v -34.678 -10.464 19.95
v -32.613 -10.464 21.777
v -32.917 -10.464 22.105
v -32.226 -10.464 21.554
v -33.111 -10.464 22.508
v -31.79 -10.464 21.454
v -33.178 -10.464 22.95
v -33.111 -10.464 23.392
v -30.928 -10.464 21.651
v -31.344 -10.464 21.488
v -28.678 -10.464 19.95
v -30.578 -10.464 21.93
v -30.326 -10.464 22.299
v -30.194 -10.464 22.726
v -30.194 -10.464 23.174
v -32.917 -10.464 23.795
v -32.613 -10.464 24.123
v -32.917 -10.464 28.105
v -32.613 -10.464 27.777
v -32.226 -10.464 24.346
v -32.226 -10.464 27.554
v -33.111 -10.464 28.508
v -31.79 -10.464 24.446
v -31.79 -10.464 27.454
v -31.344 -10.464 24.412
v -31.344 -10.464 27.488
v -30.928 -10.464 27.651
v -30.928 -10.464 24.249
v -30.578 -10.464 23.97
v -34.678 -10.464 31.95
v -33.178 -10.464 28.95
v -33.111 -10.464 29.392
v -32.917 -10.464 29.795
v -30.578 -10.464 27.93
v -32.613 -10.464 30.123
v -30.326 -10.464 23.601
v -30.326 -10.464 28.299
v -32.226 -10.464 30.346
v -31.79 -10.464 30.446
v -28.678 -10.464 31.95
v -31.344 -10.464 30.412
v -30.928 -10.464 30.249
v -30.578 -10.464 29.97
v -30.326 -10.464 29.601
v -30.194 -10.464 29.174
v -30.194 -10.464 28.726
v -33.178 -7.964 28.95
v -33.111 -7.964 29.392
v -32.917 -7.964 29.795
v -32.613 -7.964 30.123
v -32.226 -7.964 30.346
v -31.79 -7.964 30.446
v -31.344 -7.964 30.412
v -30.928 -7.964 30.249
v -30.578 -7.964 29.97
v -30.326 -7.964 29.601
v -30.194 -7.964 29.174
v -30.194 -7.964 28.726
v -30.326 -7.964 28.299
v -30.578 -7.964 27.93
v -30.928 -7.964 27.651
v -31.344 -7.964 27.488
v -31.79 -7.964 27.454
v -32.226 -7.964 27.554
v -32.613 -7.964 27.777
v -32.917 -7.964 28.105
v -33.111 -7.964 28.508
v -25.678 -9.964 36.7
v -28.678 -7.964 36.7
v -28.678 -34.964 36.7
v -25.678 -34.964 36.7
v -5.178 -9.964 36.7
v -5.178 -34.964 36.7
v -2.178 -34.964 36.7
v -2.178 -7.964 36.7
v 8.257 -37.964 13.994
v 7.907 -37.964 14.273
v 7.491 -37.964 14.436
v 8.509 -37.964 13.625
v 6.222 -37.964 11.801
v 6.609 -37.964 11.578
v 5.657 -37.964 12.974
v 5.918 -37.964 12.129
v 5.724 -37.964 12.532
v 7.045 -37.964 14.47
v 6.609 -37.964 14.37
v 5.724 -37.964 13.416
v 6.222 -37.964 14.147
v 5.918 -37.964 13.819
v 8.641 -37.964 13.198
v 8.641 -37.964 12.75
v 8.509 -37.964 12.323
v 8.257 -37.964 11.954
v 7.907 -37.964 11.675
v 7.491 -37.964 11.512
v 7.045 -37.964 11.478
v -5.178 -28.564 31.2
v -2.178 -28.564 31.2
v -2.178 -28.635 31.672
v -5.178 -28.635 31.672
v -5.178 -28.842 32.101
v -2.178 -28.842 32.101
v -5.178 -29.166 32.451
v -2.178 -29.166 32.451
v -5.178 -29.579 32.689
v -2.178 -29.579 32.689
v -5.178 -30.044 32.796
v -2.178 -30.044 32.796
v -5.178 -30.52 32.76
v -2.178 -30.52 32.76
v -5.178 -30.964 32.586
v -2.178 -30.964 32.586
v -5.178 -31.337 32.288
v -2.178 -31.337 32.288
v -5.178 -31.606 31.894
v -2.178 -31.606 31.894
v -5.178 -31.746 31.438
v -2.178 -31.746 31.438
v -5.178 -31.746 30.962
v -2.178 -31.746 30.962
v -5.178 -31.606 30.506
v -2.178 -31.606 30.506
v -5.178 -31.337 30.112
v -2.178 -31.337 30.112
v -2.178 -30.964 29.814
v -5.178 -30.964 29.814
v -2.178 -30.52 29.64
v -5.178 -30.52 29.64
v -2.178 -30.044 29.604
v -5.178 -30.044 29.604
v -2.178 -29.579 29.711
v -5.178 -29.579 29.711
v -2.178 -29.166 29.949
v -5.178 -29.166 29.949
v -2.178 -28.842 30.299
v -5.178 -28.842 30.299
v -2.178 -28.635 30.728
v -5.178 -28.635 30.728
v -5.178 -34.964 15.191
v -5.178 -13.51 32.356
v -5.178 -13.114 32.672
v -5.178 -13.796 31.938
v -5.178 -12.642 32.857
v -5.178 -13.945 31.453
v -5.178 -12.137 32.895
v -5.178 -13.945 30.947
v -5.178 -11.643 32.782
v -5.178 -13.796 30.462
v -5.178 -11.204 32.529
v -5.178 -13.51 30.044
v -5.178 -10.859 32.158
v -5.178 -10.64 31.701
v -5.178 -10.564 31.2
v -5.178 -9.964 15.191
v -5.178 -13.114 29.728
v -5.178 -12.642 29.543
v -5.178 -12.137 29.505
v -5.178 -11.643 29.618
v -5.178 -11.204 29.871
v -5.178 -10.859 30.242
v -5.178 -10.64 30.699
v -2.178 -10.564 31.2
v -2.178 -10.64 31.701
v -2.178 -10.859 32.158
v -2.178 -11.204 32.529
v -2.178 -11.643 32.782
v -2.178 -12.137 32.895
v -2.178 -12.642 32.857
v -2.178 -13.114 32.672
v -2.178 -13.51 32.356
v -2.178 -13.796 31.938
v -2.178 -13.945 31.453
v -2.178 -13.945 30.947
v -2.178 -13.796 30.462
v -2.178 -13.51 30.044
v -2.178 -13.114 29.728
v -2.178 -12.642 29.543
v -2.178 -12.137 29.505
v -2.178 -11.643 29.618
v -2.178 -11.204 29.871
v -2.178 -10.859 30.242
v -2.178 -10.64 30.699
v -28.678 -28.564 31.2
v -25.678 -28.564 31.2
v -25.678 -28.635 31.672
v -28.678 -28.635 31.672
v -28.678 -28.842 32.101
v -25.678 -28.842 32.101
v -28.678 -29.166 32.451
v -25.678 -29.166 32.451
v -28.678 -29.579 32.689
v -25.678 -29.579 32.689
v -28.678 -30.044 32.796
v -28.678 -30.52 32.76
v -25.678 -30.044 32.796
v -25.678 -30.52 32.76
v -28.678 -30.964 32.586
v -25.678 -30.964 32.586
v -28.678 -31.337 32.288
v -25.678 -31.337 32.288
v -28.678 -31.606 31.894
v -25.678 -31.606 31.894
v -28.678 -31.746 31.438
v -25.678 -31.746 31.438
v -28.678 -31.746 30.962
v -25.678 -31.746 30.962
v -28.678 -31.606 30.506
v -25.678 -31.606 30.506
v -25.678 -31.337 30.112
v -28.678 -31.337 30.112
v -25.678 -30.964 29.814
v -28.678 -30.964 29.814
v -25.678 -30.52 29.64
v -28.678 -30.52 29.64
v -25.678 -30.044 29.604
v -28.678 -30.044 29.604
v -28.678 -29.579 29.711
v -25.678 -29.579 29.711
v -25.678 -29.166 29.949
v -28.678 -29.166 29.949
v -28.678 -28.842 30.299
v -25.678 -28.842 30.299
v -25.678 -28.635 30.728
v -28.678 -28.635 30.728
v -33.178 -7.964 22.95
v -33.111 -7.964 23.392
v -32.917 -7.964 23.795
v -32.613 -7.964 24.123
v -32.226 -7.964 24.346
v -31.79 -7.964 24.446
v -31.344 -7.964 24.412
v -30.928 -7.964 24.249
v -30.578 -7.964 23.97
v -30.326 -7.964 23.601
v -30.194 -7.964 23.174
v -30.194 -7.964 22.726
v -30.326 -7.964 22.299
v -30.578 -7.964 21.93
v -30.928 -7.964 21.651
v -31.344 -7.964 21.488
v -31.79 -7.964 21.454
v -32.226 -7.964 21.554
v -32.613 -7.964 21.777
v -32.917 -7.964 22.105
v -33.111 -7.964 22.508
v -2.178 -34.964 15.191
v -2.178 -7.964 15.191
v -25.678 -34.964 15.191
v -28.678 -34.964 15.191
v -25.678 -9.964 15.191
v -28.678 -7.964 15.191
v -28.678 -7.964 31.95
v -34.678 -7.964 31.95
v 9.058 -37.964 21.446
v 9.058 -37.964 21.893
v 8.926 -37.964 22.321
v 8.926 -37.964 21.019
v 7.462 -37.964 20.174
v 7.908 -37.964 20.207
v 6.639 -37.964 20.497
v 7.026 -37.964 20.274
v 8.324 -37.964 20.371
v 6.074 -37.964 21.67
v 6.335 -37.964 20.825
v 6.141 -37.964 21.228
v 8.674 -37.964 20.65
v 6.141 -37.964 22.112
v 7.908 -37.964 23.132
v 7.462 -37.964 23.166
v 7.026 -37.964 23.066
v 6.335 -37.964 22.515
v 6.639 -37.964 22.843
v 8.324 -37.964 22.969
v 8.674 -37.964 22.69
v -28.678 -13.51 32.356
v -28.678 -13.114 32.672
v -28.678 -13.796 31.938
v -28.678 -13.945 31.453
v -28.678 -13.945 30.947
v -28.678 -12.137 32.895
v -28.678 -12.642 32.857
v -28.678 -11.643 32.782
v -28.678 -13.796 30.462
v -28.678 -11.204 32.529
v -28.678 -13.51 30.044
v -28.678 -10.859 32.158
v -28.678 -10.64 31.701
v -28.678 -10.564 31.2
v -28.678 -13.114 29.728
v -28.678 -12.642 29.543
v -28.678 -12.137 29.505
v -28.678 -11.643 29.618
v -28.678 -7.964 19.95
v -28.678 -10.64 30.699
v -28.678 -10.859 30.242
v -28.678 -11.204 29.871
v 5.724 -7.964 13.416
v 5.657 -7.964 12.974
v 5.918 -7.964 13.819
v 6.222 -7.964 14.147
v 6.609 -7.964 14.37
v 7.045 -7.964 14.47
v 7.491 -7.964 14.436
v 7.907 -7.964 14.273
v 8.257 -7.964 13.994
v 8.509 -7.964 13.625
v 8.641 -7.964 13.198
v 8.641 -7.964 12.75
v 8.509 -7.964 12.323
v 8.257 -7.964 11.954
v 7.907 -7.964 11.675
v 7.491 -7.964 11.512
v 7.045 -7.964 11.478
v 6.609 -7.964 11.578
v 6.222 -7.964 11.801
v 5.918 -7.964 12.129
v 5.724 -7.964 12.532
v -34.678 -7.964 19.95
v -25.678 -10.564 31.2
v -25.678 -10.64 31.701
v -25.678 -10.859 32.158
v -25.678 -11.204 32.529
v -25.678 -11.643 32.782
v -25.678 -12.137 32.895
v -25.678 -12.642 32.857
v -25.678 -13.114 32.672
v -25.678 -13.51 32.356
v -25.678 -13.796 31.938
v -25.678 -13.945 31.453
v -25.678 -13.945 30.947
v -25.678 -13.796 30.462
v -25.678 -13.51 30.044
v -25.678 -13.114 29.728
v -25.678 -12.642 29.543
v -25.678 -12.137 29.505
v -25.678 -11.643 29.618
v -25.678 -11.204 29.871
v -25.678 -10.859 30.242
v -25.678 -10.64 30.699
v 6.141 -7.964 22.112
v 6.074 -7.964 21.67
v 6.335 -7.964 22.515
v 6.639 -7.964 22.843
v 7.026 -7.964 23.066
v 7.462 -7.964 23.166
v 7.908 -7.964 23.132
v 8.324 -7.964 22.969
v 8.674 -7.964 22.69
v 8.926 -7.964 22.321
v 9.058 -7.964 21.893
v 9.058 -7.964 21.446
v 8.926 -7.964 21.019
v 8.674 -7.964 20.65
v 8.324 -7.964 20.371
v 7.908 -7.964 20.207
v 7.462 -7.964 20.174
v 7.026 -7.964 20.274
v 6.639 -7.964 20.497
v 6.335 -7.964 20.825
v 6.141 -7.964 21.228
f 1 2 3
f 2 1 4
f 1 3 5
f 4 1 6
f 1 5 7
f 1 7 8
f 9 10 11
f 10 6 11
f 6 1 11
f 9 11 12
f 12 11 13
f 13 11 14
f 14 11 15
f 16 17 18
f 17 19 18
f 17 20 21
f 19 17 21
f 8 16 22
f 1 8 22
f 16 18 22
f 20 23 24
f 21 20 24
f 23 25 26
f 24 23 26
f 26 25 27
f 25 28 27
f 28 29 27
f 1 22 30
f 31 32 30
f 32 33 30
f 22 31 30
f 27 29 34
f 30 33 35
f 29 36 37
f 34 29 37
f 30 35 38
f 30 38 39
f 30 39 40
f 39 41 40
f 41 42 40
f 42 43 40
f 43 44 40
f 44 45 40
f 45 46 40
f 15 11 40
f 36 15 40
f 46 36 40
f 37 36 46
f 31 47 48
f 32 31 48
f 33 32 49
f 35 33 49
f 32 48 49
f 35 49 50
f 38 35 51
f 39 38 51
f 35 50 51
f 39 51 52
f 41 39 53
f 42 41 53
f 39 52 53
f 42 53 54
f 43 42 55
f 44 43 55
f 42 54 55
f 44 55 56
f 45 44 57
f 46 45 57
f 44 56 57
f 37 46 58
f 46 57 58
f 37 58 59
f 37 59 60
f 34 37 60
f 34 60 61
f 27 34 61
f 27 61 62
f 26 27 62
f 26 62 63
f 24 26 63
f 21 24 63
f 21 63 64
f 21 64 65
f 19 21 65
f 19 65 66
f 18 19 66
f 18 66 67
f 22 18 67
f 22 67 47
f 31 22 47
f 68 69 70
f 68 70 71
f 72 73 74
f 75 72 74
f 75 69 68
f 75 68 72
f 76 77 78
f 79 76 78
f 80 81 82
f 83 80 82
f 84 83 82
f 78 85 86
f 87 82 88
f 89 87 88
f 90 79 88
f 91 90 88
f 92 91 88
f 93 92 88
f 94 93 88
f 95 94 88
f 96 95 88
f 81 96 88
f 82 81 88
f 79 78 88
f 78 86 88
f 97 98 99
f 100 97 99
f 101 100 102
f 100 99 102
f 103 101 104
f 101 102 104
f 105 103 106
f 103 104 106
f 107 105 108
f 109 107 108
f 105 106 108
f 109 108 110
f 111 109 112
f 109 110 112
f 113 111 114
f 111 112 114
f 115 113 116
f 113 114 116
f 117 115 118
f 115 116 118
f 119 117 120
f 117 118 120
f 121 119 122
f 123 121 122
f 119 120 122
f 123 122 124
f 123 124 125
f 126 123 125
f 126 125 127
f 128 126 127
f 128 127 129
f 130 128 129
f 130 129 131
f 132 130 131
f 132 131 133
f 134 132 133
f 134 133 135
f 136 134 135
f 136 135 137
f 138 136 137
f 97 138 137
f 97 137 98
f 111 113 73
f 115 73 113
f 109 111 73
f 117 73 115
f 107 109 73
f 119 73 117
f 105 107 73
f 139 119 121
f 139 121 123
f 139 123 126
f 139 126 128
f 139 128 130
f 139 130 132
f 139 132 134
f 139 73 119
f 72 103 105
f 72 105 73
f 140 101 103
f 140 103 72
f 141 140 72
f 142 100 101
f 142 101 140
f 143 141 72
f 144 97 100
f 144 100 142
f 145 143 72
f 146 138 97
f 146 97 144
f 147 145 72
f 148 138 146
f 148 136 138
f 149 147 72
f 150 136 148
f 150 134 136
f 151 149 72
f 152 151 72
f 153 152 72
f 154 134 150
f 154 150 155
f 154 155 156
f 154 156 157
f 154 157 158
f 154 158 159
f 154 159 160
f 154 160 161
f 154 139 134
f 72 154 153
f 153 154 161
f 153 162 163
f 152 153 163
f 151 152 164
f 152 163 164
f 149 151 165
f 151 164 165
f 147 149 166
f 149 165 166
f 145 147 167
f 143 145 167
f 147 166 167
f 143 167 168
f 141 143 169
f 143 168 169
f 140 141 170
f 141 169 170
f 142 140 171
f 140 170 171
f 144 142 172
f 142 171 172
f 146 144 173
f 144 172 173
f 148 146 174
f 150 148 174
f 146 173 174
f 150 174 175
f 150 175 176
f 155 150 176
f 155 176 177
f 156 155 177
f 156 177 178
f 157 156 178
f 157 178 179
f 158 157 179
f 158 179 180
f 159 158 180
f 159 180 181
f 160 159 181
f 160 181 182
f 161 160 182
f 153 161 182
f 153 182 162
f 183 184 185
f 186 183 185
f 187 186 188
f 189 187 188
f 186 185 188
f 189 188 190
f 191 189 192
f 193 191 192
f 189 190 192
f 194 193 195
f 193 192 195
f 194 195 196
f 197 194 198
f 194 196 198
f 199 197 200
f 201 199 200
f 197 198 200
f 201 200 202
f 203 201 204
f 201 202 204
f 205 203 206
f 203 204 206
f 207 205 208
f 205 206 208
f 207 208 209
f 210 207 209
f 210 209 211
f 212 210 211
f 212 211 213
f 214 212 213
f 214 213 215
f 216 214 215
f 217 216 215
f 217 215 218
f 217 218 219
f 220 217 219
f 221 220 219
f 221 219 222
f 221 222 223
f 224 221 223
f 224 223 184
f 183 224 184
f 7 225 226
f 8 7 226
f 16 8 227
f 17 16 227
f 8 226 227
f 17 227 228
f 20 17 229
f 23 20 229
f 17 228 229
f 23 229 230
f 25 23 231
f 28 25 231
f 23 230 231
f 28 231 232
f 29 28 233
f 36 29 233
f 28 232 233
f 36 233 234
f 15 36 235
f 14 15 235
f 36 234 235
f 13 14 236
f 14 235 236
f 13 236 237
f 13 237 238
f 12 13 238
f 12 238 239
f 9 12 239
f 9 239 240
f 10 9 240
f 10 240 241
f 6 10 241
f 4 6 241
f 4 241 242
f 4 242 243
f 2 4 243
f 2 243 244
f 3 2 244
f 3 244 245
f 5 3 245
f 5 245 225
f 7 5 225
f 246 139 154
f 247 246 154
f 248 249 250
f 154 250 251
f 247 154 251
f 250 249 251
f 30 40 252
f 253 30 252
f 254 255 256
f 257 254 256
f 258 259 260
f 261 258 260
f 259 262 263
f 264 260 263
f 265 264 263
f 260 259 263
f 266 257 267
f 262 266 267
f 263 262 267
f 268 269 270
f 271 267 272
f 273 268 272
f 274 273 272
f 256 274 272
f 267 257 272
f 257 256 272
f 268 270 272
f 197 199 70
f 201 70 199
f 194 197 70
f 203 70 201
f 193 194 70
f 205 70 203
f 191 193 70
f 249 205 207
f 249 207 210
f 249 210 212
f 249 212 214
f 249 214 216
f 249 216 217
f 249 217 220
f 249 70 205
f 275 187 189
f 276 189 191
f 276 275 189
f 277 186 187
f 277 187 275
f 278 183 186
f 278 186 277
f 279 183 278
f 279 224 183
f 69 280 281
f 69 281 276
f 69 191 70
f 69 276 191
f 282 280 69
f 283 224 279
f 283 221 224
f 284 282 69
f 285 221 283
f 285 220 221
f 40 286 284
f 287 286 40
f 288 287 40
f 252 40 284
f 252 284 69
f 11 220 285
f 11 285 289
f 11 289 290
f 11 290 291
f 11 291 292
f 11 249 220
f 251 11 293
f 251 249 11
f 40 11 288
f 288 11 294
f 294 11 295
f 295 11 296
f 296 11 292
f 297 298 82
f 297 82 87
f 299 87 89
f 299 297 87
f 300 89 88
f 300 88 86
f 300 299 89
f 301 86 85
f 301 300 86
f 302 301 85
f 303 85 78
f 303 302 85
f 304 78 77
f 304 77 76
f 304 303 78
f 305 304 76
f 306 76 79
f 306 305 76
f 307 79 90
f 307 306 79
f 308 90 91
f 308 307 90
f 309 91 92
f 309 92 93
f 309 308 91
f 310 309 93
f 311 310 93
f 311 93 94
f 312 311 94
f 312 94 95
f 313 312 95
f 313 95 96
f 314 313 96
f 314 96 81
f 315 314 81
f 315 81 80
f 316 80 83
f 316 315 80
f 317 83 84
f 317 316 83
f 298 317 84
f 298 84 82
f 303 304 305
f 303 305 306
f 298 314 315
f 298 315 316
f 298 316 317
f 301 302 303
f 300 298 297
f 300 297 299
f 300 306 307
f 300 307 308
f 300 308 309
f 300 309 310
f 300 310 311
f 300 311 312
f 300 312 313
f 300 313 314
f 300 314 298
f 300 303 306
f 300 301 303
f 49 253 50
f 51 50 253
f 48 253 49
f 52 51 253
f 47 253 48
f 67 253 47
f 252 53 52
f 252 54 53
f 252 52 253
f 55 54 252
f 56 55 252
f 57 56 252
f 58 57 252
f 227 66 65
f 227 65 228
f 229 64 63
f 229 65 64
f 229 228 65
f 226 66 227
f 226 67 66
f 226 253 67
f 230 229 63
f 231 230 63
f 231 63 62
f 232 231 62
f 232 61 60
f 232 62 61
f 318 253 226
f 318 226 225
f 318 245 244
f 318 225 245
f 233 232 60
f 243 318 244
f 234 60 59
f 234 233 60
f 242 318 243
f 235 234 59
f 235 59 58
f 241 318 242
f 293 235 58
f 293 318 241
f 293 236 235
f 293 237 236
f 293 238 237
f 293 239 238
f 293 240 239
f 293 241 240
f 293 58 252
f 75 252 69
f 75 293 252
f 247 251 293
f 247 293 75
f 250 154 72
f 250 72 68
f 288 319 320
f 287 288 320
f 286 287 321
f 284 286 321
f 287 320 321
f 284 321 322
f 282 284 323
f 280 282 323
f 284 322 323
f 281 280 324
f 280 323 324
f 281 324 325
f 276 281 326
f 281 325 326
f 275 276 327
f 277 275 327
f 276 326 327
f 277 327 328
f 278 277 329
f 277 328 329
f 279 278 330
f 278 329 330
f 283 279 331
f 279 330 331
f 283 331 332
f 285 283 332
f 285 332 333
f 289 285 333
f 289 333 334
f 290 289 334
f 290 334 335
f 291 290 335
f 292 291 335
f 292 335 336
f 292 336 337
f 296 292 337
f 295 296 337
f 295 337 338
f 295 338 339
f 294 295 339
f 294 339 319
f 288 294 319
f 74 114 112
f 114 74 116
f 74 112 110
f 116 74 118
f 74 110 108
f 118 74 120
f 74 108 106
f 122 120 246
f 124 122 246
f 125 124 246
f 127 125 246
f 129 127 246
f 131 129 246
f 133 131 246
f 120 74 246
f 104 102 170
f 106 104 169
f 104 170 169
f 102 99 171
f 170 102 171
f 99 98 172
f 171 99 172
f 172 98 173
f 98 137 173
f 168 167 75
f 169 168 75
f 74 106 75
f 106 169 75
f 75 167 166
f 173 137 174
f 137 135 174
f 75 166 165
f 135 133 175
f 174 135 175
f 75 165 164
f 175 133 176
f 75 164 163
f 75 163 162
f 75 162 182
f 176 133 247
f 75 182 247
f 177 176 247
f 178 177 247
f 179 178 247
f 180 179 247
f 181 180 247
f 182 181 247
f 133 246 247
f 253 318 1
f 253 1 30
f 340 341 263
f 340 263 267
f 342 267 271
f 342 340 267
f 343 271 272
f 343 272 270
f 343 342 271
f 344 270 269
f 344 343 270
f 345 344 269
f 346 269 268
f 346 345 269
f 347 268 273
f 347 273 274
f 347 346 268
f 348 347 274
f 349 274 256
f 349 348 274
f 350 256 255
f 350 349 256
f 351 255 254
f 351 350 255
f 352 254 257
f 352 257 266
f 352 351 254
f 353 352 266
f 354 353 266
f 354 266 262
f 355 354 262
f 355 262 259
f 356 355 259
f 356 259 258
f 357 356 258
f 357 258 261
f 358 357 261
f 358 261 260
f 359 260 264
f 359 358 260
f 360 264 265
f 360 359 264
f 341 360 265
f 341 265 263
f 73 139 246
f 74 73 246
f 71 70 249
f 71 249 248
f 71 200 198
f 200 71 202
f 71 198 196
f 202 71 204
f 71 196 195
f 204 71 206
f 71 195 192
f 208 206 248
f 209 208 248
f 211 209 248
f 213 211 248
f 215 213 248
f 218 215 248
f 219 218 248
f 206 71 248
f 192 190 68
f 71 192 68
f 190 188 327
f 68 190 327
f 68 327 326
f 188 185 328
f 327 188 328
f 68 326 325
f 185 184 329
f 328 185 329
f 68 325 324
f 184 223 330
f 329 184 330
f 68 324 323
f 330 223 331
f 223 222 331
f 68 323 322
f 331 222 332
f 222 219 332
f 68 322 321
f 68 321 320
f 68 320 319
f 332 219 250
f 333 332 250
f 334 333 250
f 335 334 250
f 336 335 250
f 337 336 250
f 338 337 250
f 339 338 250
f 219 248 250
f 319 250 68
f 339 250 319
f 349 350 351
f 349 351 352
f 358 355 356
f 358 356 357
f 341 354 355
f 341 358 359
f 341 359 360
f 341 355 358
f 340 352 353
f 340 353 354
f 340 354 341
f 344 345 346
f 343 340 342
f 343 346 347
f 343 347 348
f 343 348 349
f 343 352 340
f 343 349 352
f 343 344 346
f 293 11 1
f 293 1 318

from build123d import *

# Parameters (mm, degrees)
SKETCH1_W             = 26.5
SKETCH1_H             = 27
BOSS_EXTRUDE1_DEPTH   = 36.7
SKETCH2_W             = 20.5
SKETCH2_H             = 25
CUT_EXTRUDE1_DEPTH    = 36.7
SKETCH3_R             = 1.7
SKETCH3_R_2           = 1.6
CUT_EXTRUDE2_DEPTH    = 36.7
SKETCH4_R             = 3
CUT_EXTRUDE3_DEPTH    = 36.7
SKETCH8_R             = 1.5
BOSS_EXTRUDE3_DEPTH   = 30
BOSS_EXTRUDE3_2_DEPTH = 30
SKETCH9_W             = 5.918746276
SKETCH9_H             = 6
SKETCH9_W_2           = 6.707912446
CUT_EXTRUDE4_DEPTH    = 12
SKETCH11_W            = 15.191448775
SKETCH11_H            = 37.067540439
CUT_EXTRUDE6_DEPTH    = 32
SKETCH12_W            = 12
SKETCH12_H            = 2.5
BOSS_EXTRUDE4_DEPTH   = 6
SKETCH13_R            = 1.5
CUT_EXTRUDE7_DEPTH    = 6
SKETCH14_W            = 11.732424075
SKETCH14_H            = 31.976606793
CUT_EXTRUDE8_DEPTH    = 10
SKETCH15_W            = 6
SKETCH15_H            = 12.008551225
SKETCH15_R            = 1.5
BOSS_EXTRUDE5_DEPTH   = 2.5
SKETCH17_W            = 99.088440485
SKETCH17_H            = 65.829588933
CUT_EXTRUDE9_DEPTH    = 50


with BuildPart() as part:
    # Sketch1 → Boss-Extrude1 (new body)
    with BuildSketch(Plane.XY):
        with Locations((-15.427732696, -21.46401366)):
            Rectangle(SKETCH1_W, SKETCH1_H)
    extrude(amount=BOSS_EXTRUDE1_DEPTH)

    # Sketch2 → Cut-Extrude1 (cut)
    with BuildSketch(Plane(origin=(0, 0, 0), x_dir=(-1, 0, 0), z_dir=(0, 0, -1))):
        with Locations((15.427732696, -22.46401366)):
            Rectangle(SKETCH2_W, SKETCH2_H)
    extrude(amount=-CUT_EXTRUDE1_DEPTH, mode=Mode.SUBTRACT)

    # Sketch3 → Cut-Extrude2 (cut)
    with BuildSketch(Plane(origin=(-2.177732696, 0, 0), x_dir=(0, 0, -1), z_dir=(1, 0, 0))):
        with Locations(Location((-31.2, -12.26401366, 0), (0, 0, 90))):
            Circle(SKETCH3_R)
        with Locations(Location((-31.2, -30.16401366, 0), (0, 0, 90))):
            Circle(SKETCH3_R_2)
    extrude(amount=-CUT_EXTRUDE2_DEPTH, mode=Mode.SUBTRACT)

    # Sketch4 → Cut-Extrude3 (cut)
    with BuildSketch(Plane(origin=(-2.177732696, 0, 0), x_dir=(0, 0, -1), z_dir=(1, 0, 0))):
        with Locations(Location((-12.025092395, -21.16401366, 0), (0, 0, 90))):
            Circle(SKETCH4_R)
    extrude(amount=-CUT_EXTRUDE3_DEPTH, mode=Mode.SUBTRACT)

    # Sketch9 → Cut-Extrude4 (cut)
    with BuildSketch(Plane(origin=(0, 0, 0), x_dir=(-1, 0, 0), z_dir=(0, 0, -1))):
        with Locations((3.689038825, -21.16401366)):
            Rectangle(SKETCH9_W, SKETCH9_H)
        with Locations((28.103867214, -21.16401366)):
            Rectangle(SKETCH9_W_2, SKETCH9_H)
    extrude(amount=-CUT_EXTRUDE4_DEPTH, mode=Mode.SUBTRACT)

    # Sketch11 → Cut-Extrude6 (cut)
    with BuildSketch(Plane.ZY.offset(28.677732696)):
        with Locations((7.595724388, -16.43024344)):
            Rectangle(SKETCH11_W, SKETCH11_H)
    extrude(amount=-CUT_EXTRUDE6_DEPTH, mode=Mode.SUBTRACT)

    # Sketch12 → Boss-Extrude4 (add)
    with BuildSketch(Plane.ZY.offset(28.677732696)):
        with Locations((25.95, -9.21401366)):
            Rectangle(SKETCH12_W, SKETCH12_H)
    extrude(amount=BOSS_EXTRUDE4_DEPTH)

    # Sketch13 → Cut-Extrude7 (cut)
    with BuildSketch(Plane(origin=(0, -7.96401366, 0), x_dir=(1, 0, 0), z_dir=(0, 1, 0))):
        with Locations(Location((-31.677732696, -22.95, 0), (0, 0, 180))):
            Circle(SKETCH13_R)
        with Locations(Location((-31.677732696, -28.95, 0), (0, 0, 180))):
            Circle(SKETCH13_R)
    extrude(amount=-CUT_EXTRUDE7_DEPTH, mode=Mode.SUBTRACT)


with BuildPart() as body_2:
    # Sketch8 → Boss-Extrude3 (new body)
    with BuildSketch(Plane(origin=(0, -7.96401366, 0), x_dir=(1, 0, 0), z_dir=(0, 1, 0))):
        with Locations(Location((7.15742756, -12.973989901, 0), (0, 0, 180))):
            Circle(SKETCH8_R)
    extrude(amount=-BOSS_EXTRUDE3_DEPTH)


with BuildPart() as body_3:
    # Sketch8 → Boss-Extrude3 2 (new body)
    with BuildSketch(Plane(origin=(0, -7.96401366, 0), x_dir=(1, 0, 0), z_dir=(0, 1, 0))):
        with Locations(Location((7.574350551, -21.669812293, 0), (0, 0, 180))):
            Circle(SKETCH8_R)
    extrude(amount=-BOSS_EXTRUDE3_2_DEPTH)


with BuildPart() as body_4:
    # Body-Move/Copy4: copy of part
    add(part.part.moved(Location((-70.821628829, 0, 0))))

    # Sketch14 → Cut-Extrude8 (cut)
    with BuildSketch(Plane(origin=(0, -7.96401366, 0), x_dir=(1, 0, 0), z_dir=(0, 1, 0))):
        with Locations((-105.365573562, -18.867606945)):
            Rectangle(SKETCH14_W, SKETCH14_H)
    extrude(amount=-CUT_EXTRUDE8_DEPTH, mode=Mode.SUBTRACT)

    # Sketch15 → Boss-Extrude5 (add)
    with BuildSketch(Plane(origin=(0, -7.96401366, 0), x_dir=(1, 0, 0), z_dir=(0, 1, 0))):
        with Locations((-69.999361524, -25.945724388)):
            Rectangle(SKETCH15_W, SKETCH15_H)
        with Locations(Location((-69.999361524, -22.941448775, 0), (0, 0, 180))):
            Circle(SKETCH15_R, mode=Mode.SUBTRACT)
        with Locations(Location((-69.999361524, -28.95, 0), (0, 0, 180))):
            Circle(SKETCH15_R, mode=Mode.SUBTRACT)
    extrude(amount=-BOSS_EXTRUDE5_DEPTH)


with BuildPart() as body_5:
    # Body-Move/Copy5: copy of body 2
    add(body_2.part.moved(Location((-69.754488263, 0, 0))))


with BuildPart() as body_6:
    # Body-Move/Copy6: copy of body 3
    add(body_3.part.moved(Location((-71.521118541, 0, 0))))


with BuildPart() as cut_extrude9_tool:
    # Sketch17 → Cut-Extrude9 (new body)
    with BuildSketch(Plane(origin=(0, -7.96401366, 0), x_dir=(1, 0, 0), z_dir=(0, 1, 0))):
        with Locations((-104.540526015, -10.422992559)):
            Rectangle(SKETCH17_W, SKETCH17_H)
    extrude(amount=-CUT_EXTRUDE9_DEPTH)


with BuildPart() as body_4_1:
    add(body_4.part)

    # Cut-Extrude9: cut by cut_extrude9_tool
    add(cut_extrude9_tool.part, mode=Mode.SUBTRACT)


with BuildPart() as body_5_1:
    add(body_5.part)

    # Cut-Extrude9: cut by cut_extrude9_tool
    add(cut_extrude9_tool.part, mode=Mode.SUBTRACT)


with BuildPart() as body_6_1:
    add(body_6.part)

    # Cut-Extrude9: cut by cut_extrude9_tool
    add(cut_extrude9_tool.part, mode=Mode.SUBTRACT)


solid = Compound([part.part, body_2.part, body_3.part])
